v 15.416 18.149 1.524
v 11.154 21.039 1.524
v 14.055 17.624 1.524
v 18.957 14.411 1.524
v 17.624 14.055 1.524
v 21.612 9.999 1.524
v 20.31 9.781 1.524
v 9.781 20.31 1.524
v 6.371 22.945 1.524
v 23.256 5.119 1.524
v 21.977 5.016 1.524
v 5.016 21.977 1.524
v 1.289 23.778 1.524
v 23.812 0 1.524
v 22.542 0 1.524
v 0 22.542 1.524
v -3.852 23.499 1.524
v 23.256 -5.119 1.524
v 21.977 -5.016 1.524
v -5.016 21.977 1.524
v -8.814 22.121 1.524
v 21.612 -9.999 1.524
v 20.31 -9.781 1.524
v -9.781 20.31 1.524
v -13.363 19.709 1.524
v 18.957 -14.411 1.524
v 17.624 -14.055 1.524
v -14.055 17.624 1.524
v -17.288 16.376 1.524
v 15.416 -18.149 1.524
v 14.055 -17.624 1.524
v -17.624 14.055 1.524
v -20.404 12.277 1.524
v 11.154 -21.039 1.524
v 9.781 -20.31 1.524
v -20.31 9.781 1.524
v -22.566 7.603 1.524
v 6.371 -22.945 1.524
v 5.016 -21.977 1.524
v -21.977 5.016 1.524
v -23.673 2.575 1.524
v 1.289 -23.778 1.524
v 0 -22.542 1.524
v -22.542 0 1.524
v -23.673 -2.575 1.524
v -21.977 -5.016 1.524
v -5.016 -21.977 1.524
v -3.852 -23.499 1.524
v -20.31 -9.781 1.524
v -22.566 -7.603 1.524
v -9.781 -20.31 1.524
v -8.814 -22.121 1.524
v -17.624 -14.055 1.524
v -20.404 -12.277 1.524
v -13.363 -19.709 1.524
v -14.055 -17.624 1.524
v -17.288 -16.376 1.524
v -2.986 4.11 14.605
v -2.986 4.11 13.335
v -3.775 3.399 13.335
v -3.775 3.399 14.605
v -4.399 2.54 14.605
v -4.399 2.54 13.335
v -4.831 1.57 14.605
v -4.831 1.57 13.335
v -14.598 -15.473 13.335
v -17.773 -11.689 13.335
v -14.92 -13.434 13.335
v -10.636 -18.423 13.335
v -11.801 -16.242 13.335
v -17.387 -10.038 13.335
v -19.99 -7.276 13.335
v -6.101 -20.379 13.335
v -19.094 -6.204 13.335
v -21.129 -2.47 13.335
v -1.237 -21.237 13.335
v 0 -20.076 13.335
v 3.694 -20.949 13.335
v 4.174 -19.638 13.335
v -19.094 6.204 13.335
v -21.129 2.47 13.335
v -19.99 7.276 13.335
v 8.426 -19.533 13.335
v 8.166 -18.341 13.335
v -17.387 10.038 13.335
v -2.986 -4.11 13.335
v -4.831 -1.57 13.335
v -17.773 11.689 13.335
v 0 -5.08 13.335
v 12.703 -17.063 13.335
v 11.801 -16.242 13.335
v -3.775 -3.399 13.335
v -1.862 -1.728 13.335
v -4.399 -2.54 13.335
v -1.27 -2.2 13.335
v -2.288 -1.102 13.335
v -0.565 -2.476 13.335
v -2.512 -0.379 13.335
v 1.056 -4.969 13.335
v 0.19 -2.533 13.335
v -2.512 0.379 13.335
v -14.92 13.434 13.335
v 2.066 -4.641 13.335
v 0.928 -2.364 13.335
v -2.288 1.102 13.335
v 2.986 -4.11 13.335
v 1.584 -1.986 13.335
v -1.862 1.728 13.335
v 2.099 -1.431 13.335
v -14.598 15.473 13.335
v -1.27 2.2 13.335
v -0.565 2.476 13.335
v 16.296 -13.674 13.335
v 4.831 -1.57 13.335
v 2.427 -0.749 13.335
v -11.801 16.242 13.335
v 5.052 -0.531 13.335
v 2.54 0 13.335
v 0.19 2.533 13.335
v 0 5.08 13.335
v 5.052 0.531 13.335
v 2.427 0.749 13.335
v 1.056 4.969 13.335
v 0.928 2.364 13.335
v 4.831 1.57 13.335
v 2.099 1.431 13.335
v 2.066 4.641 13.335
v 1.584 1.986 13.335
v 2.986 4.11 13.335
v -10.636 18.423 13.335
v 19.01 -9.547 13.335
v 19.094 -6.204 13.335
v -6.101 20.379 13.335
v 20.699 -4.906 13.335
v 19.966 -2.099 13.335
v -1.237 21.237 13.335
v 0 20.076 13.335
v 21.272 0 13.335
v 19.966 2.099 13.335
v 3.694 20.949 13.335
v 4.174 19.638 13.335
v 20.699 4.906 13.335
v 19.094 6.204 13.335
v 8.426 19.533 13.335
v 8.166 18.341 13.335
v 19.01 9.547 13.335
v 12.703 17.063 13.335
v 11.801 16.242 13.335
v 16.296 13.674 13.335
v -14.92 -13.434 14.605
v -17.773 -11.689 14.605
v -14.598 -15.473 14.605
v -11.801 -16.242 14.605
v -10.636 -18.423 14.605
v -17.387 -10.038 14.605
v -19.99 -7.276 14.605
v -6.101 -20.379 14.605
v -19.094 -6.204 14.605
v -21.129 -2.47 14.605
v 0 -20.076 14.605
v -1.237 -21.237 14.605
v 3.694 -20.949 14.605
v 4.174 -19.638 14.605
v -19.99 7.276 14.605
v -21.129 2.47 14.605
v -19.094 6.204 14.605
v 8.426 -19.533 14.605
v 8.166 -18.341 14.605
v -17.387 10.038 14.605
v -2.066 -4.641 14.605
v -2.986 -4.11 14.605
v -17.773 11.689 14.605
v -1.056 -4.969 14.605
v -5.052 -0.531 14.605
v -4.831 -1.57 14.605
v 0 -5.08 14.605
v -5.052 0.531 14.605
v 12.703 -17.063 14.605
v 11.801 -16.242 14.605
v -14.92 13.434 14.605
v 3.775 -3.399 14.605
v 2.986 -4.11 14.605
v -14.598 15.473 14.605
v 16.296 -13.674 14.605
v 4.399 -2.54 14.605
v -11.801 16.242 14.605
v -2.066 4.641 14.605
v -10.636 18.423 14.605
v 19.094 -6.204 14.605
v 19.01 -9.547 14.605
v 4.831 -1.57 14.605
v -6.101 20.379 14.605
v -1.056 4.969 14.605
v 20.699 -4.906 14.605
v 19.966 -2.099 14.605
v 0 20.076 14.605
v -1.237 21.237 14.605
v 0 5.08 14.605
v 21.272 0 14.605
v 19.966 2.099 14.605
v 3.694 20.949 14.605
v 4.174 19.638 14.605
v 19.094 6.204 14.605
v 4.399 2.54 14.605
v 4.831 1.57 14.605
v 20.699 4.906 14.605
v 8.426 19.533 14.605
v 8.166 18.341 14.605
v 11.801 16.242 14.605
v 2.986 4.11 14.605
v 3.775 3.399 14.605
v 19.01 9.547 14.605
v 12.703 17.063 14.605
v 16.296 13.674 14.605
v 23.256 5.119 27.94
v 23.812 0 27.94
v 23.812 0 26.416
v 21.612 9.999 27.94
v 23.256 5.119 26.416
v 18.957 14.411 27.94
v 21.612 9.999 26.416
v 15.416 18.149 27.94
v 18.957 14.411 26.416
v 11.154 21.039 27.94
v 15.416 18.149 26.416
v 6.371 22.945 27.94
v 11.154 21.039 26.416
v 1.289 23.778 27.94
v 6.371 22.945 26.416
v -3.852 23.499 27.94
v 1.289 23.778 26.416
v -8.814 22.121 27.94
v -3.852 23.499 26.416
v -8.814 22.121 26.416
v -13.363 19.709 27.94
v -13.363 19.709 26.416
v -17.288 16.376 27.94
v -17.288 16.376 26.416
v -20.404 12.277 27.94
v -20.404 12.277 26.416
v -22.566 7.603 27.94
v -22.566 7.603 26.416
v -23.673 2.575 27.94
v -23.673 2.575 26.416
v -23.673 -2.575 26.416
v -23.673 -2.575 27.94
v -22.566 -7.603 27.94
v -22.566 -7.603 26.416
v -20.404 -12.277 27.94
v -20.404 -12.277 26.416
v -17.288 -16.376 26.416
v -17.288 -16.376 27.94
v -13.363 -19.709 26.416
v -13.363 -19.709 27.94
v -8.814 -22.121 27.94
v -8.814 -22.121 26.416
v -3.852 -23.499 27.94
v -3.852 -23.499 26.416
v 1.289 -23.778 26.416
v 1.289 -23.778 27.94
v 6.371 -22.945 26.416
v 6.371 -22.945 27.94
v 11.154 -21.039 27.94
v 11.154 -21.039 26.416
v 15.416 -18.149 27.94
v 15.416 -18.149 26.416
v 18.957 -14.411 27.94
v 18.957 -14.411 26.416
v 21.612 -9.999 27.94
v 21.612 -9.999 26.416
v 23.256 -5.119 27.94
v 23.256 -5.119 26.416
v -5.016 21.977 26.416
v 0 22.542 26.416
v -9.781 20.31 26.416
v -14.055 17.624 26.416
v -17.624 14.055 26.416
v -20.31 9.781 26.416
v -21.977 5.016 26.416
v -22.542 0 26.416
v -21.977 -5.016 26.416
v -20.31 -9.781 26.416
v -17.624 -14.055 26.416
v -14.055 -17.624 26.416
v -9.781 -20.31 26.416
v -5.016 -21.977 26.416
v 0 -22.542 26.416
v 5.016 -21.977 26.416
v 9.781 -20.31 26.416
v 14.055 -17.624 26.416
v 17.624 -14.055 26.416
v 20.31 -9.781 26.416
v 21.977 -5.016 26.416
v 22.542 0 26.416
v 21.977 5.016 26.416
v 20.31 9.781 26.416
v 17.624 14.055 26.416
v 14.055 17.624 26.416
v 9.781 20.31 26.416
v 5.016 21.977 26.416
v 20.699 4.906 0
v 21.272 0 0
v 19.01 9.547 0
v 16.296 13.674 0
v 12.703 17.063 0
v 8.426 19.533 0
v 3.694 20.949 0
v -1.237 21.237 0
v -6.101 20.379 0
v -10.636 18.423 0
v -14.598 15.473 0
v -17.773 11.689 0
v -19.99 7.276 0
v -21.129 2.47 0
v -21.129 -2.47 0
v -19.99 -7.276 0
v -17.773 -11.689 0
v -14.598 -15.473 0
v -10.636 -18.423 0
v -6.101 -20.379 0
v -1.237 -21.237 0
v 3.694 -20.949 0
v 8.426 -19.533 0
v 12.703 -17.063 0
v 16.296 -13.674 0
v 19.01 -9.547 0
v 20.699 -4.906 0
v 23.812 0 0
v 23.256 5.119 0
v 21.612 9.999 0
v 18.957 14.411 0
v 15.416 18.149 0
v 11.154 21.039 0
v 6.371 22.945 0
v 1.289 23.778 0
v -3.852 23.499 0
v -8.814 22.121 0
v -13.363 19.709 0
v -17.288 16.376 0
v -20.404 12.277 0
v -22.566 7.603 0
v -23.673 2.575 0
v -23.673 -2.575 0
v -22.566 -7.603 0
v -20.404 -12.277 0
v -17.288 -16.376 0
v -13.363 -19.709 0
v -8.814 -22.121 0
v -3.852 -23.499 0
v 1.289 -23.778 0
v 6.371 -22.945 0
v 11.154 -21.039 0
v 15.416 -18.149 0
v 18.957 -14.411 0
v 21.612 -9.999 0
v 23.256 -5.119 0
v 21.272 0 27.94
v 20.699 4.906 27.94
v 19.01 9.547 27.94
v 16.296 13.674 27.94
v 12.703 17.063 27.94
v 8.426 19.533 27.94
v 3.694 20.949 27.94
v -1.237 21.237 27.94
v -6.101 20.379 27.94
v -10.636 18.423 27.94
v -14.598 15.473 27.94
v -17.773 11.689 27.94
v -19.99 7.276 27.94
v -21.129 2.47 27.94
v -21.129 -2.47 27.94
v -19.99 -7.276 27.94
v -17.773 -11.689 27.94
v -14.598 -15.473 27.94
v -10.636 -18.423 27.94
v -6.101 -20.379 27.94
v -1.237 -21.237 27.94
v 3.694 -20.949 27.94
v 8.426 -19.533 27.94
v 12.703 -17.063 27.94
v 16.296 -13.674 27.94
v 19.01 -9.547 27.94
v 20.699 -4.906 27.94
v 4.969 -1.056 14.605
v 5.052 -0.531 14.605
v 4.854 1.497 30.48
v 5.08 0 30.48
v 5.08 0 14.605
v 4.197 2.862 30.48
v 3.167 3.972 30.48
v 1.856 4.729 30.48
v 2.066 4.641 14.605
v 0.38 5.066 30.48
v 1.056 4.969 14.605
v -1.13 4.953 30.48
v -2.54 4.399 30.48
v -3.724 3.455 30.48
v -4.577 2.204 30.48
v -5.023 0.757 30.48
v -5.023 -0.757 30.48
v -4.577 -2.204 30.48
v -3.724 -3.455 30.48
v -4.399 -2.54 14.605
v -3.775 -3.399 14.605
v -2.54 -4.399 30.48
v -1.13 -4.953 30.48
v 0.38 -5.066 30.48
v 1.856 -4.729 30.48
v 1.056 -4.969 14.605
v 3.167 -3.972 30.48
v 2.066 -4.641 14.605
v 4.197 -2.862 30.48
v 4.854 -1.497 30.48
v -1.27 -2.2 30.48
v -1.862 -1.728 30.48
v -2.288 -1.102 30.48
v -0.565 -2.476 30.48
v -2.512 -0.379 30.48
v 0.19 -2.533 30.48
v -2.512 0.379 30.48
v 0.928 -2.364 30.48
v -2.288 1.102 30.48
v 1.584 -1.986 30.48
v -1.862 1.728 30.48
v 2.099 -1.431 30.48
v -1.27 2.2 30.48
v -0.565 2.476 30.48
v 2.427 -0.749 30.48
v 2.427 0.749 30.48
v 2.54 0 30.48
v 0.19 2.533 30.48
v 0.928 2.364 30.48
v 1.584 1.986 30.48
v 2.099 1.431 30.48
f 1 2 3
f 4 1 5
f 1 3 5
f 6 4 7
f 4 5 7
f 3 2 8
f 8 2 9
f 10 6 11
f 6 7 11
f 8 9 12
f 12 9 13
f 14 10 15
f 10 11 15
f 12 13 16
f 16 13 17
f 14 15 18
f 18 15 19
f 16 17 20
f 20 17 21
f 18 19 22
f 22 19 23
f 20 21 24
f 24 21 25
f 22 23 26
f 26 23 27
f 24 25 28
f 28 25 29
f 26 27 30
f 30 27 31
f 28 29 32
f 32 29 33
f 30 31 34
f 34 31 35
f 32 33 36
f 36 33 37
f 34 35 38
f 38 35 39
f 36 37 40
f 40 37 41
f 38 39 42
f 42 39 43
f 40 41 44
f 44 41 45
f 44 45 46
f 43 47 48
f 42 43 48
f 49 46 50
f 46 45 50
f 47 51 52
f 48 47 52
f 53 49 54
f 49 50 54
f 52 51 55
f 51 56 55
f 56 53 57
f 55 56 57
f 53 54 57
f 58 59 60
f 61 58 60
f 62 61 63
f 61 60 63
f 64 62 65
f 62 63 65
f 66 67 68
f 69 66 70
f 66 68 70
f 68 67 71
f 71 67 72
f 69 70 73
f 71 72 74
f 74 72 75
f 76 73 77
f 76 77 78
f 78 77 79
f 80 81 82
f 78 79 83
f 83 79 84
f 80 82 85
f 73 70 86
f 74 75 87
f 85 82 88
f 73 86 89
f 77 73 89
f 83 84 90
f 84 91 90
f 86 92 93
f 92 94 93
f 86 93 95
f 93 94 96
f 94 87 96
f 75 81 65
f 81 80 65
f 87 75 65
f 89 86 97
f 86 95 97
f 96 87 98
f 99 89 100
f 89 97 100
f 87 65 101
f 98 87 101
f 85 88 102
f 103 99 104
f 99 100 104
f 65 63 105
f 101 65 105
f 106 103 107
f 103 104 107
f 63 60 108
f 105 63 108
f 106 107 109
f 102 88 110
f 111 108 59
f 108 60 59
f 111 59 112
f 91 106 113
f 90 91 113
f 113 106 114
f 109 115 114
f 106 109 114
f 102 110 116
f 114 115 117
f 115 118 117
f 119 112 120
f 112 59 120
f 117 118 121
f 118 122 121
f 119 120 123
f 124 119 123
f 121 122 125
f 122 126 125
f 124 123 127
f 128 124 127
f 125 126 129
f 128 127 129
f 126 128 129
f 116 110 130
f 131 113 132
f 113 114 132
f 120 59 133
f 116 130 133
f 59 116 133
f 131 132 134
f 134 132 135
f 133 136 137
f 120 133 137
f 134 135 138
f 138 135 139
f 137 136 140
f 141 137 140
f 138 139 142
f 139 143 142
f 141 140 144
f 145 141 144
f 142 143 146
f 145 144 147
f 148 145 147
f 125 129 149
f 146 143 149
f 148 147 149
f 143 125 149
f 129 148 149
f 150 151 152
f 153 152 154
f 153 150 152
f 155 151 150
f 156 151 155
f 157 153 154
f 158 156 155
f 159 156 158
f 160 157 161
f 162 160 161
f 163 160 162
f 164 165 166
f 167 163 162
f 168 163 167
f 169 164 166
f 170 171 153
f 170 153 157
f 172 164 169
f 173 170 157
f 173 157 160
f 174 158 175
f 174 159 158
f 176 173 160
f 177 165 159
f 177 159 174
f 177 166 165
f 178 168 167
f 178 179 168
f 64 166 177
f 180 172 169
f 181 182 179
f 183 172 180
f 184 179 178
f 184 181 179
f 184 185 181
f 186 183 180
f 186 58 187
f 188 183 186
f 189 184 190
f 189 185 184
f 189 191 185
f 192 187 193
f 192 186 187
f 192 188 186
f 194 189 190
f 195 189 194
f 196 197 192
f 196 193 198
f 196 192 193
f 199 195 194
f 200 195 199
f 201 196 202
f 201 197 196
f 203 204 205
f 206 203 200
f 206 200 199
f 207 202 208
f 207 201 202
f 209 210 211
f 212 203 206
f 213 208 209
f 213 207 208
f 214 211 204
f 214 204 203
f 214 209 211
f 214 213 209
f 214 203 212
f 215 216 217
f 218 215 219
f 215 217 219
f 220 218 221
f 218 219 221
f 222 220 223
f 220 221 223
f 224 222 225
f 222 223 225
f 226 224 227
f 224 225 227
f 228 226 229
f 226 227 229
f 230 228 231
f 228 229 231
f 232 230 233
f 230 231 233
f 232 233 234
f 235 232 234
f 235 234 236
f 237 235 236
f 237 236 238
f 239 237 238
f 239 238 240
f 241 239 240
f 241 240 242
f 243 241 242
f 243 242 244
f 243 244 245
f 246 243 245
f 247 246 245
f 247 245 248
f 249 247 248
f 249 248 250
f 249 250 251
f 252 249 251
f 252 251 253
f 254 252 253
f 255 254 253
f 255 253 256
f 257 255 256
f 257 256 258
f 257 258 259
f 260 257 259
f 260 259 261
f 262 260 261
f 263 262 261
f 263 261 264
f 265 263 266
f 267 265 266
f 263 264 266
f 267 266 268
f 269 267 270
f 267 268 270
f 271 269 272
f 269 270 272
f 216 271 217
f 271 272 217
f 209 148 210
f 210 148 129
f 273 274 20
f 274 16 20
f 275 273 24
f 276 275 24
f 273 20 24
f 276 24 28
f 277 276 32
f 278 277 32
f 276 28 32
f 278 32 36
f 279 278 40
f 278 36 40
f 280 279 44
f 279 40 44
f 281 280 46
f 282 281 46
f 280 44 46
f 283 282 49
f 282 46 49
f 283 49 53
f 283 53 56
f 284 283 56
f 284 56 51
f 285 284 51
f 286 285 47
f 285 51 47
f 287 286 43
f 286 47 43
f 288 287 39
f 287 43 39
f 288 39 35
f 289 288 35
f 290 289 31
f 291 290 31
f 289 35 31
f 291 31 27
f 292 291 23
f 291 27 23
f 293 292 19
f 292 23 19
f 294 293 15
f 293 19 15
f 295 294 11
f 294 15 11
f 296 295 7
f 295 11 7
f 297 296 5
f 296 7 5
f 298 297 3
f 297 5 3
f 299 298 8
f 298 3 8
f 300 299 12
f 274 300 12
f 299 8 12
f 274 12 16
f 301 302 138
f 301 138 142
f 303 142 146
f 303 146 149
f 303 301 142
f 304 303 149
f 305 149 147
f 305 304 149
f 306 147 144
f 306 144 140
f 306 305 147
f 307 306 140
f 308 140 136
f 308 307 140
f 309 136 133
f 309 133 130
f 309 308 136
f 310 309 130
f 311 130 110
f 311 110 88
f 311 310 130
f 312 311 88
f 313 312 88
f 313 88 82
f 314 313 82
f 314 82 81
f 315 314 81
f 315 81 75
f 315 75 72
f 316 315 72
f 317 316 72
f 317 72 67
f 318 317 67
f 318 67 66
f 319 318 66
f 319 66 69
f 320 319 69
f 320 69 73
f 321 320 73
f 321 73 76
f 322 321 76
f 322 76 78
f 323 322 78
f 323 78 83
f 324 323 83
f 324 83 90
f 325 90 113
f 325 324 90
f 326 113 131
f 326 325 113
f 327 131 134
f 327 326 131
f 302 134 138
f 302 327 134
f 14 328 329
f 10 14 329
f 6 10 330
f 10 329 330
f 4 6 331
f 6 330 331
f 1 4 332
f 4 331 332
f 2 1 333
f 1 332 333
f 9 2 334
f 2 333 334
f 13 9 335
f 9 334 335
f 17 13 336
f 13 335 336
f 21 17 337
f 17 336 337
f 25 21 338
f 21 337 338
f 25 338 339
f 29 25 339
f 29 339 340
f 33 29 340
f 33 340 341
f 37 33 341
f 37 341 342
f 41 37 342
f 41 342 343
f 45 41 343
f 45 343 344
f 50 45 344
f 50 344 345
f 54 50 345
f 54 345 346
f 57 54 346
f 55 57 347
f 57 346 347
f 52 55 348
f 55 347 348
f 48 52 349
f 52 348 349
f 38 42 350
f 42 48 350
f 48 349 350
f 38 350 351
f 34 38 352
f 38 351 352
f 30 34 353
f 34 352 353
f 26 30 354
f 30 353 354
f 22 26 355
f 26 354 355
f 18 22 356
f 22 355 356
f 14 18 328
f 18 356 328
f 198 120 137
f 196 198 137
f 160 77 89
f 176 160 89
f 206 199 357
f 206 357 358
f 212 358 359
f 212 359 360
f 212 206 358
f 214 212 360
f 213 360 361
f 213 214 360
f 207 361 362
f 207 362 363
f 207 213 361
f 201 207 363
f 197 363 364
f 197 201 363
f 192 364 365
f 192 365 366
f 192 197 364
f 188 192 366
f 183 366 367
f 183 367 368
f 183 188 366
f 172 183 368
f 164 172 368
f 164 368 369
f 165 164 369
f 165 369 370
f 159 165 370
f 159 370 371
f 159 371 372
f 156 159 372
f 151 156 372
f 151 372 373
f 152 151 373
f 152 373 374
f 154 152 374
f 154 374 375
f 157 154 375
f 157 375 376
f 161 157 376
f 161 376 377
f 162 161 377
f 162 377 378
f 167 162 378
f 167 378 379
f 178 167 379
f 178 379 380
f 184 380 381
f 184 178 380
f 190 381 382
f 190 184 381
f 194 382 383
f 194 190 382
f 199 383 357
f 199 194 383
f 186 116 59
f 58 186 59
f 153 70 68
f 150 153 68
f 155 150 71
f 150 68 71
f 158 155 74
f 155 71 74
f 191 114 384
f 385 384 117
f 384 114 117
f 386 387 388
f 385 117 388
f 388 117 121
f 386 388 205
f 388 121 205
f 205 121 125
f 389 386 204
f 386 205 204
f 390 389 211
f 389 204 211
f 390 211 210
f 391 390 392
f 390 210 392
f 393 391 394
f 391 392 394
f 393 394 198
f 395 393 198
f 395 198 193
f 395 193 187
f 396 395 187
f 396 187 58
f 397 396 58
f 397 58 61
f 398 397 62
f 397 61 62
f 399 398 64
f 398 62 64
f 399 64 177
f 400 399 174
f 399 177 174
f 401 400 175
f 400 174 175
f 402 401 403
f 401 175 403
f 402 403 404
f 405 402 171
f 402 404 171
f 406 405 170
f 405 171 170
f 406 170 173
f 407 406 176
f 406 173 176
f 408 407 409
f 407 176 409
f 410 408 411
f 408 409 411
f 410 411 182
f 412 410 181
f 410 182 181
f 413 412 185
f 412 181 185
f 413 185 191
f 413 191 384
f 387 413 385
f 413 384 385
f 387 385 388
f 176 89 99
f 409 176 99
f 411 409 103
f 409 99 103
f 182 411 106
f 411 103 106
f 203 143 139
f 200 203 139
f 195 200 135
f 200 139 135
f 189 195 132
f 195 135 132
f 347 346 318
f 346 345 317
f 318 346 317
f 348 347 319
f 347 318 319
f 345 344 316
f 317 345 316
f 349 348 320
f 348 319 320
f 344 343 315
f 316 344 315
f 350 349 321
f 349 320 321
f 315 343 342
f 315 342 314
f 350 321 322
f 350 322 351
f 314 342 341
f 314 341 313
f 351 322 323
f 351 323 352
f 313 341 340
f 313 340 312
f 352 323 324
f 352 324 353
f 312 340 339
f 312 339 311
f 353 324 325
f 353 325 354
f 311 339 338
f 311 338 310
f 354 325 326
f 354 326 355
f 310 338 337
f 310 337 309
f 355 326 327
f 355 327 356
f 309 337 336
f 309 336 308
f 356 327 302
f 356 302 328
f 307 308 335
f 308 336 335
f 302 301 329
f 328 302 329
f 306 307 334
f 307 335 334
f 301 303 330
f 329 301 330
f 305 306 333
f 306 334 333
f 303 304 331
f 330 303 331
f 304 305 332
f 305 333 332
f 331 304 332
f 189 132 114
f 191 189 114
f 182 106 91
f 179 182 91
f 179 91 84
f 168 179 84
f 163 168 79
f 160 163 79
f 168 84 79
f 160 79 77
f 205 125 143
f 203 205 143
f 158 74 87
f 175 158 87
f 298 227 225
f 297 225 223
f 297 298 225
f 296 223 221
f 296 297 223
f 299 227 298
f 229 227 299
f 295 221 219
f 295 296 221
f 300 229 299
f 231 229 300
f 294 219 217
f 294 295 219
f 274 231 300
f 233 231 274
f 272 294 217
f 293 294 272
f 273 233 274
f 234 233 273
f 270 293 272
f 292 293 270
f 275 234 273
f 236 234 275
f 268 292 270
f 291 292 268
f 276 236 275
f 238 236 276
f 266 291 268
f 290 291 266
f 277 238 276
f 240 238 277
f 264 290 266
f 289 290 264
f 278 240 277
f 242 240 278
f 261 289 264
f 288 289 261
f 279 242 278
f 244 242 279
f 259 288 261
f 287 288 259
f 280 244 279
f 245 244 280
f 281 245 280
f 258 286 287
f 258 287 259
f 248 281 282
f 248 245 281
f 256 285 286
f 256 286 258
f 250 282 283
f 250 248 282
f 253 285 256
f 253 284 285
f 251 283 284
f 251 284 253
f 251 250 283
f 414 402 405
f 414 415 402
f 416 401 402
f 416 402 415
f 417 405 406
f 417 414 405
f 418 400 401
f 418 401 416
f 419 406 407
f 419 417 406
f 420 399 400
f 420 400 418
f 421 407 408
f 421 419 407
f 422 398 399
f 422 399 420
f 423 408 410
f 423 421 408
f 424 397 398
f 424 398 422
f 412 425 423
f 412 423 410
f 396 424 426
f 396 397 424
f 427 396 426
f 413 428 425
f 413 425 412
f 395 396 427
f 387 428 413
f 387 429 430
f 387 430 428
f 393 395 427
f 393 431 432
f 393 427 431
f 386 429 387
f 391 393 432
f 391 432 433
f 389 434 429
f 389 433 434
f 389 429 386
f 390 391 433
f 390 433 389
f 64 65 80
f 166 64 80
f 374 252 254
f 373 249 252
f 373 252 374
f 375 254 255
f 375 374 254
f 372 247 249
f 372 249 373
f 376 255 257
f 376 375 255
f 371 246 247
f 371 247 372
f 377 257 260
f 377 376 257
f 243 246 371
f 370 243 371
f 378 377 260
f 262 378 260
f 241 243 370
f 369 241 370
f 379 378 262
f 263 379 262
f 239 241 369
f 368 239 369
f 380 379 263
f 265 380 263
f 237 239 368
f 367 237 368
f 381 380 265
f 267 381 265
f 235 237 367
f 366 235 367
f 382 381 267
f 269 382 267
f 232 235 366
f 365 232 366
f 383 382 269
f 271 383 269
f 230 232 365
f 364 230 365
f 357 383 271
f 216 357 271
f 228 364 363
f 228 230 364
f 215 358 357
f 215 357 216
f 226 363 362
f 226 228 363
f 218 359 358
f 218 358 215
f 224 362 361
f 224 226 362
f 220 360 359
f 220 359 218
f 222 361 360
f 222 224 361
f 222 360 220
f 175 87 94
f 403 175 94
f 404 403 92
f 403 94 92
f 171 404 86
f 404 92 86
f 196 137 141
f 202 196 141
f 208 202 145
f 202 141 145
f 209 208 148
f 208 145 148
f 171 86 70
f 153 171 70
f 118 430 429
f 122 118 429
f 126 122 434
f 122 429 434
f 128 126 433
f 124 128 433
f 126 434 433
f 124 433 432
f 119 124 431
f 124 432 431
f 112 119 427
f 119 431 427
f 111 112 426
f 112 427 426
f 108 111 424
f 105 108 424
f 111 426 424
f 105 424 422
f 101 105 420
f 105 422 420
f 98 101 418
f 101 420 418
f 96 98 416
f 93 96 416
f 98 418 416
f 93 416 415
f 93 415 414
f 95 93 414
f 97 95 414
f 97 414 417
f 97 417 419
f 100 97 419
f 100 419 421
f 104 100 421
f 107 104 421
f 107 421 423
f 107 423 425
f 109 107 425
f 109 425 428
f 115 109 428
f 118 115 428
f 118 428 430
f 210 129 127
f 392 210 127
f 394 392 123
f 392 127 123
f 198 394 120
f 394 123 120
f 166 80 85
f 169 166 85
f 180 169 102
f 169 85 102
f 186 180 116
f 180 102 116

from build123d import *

# Parameters (mm, degrees)
SKETCH1_R               = 23.8125
SKETCH1_R_2             = 21.2725
BOSS_EXTRUDE1_DEPTH     = 27.94
SKETCH2_W               = 24.892
SKETCH2_H               = 1.27
SKETCH5_R               = 21.2725
BOSS_EXTRUDE2_DEPTH     = 0.635
CUT_EXTRUDE2_DEPTH      = 37.706625253
CUT_EXTRUDE2_DEPTH_BACK = 37.706625253
SKETCH7_R               = 5.08
BOSS_EXTRUDE7_DEPTH     = 15.875
SKETCH8_R               = 2.54
CUT_EXTRUDE3_DEPTH      = 19.05


with BuildPart() as part:
    # Sketch1 → Boss-Extrude1 (new body)
    with BuildSketch(Plane.XY):
        Circle(SKETCH1_R)
        Circle(SKETCH1_R_2, mode=Mode.SUBTRACT)
    extrude(amount=BOSS_EXTRUDE1_DEPTH)

    # Sketch2 → Cut-Revolve2 (revolve, cut)
    with BuildSketch(Plane(origin=(0, 0, 0), x_dir=(0, 0, -1), z_dir=(1, 0, 0))):
        with Locations((-13.97, 23.1775)):
            Rectangle(SKETCH2_W, SKETCH2_H)
    revolve(axis=Axis((0, 0, 0), (0, 0, 1)), mode=Mode.SUBTRACT)

    # Sketch5 → Boss-Extrude2 (add, symmetric)
    with BuildSketch(Plane.XY.offset(13.97)):
        Circle(SKETCH5_R)
    extrude(amount=BOSS_EXTRUDE2_DEPTH, both=True)

    # Sketch6 → Cut-Extrude2 (cut, two sides: drawn at the far end of the back side and taken through both)
    with BuildSketch(Plane.XY.offset(14.605).offset(-CUT_EXTRUDE2_DEPTH_BACK)):
        with BuildLine():
            Line((0, 5.08), (0, 20.076289255))
            ThreePointArc((0, 20.076289255), (6.203914564, 19.093685719), (11.800546745, 16.242059191))
            Line((11.800546745, 16.242059191), (2.985949082, 4.109806331))
            ThreePointArc((2.985949082, 4.109806331), (1.569806331, 4.831367103), (0, 5.08))
        make_face()
        with BuildLine():
            Line((4.831367103, 1.569806331), (19.093685719, 6.203914564))
            ThreePointArc((19.093685719, 6.203914564), (20.076289255, 0), (19.093685719, -6.203914564))
            Line((19.093685719, -6.203914564), (4.831367103, -1.569806331))
            ThreePointArc((4.831367103, -1.569806331), (5.08, 0), (4.831367103, 1.569806331))
        make_face()
        with BuildLine():
            Line((2.985949082, -4.109806331), (11.800546745, -16.242059191))
            ThreePointArc((11.800546745, -16.242059191), (6.203914564, -19.093685719), (0, -20.076289255))
            Line((0, -20.076289255), (0, -5.08))
            ThreePointArc((0, -5.08), (1.569806331, -4.831367103), (2.985949082, -4.109806331))
        make_face()
        with BuildLine():
            Line((-2.985949082, -4.109806331), (-11.800546745, -16.242059191))
            ThreePointArc((-11.800546745, -16.242059191), (-16.242059191, -11.800546745), (-19.093685719, -6.203914564))
            Line((-19.093685719, -6.203914564), (-4.831367103, -1.569806331))
            ThreePointArc((-4.831367103, -1.569806331), (-4.109806331, -2.985949082), (-2.985949082, -4.109806331))
        make_face()
        with BuildLine():
            Line((-4.831367103, 1.569806331), (-19.093685719, 6.203914564))
            ThreePointArc((-19.093685719, 6.203914564), (-16.242059191, 11.800546745), (-11.800546745, 16.242059191))
            Line((-11.800546745, 16.242059191), (-2.985949082, 4.109806331))
            ThreePointArc((-2.985949082, 4.109806331), (-4.109806331, 2.985949082), (-4.831367103, 1.569806331))
        make_face()
    extrude(amount=CUT_EXTRUDE2_DEPTH + CUT_EXTRUDE2_DEPTH_BACK, mode=Mode.SUBTRACT)

    # Sketch7 → Boss-Extrude7 (add)
    with BuildSketch(Plane.XY.offset(14.605)):
        Circle(SKETCH7_R)
    extrude(amount=BOSS_EXTRUDE7_DEPTH)

    # Sketch8 → Cut-Extrude3 (cut)
    with BuildSketch(Plane.XY.offset(30.48)):
        Circle(SKETCH8_R)
    extrude(amount=-CUT_EXTRUDE3_DEPTH, mode=Mode.SUBTRACT)


solid = part.part
